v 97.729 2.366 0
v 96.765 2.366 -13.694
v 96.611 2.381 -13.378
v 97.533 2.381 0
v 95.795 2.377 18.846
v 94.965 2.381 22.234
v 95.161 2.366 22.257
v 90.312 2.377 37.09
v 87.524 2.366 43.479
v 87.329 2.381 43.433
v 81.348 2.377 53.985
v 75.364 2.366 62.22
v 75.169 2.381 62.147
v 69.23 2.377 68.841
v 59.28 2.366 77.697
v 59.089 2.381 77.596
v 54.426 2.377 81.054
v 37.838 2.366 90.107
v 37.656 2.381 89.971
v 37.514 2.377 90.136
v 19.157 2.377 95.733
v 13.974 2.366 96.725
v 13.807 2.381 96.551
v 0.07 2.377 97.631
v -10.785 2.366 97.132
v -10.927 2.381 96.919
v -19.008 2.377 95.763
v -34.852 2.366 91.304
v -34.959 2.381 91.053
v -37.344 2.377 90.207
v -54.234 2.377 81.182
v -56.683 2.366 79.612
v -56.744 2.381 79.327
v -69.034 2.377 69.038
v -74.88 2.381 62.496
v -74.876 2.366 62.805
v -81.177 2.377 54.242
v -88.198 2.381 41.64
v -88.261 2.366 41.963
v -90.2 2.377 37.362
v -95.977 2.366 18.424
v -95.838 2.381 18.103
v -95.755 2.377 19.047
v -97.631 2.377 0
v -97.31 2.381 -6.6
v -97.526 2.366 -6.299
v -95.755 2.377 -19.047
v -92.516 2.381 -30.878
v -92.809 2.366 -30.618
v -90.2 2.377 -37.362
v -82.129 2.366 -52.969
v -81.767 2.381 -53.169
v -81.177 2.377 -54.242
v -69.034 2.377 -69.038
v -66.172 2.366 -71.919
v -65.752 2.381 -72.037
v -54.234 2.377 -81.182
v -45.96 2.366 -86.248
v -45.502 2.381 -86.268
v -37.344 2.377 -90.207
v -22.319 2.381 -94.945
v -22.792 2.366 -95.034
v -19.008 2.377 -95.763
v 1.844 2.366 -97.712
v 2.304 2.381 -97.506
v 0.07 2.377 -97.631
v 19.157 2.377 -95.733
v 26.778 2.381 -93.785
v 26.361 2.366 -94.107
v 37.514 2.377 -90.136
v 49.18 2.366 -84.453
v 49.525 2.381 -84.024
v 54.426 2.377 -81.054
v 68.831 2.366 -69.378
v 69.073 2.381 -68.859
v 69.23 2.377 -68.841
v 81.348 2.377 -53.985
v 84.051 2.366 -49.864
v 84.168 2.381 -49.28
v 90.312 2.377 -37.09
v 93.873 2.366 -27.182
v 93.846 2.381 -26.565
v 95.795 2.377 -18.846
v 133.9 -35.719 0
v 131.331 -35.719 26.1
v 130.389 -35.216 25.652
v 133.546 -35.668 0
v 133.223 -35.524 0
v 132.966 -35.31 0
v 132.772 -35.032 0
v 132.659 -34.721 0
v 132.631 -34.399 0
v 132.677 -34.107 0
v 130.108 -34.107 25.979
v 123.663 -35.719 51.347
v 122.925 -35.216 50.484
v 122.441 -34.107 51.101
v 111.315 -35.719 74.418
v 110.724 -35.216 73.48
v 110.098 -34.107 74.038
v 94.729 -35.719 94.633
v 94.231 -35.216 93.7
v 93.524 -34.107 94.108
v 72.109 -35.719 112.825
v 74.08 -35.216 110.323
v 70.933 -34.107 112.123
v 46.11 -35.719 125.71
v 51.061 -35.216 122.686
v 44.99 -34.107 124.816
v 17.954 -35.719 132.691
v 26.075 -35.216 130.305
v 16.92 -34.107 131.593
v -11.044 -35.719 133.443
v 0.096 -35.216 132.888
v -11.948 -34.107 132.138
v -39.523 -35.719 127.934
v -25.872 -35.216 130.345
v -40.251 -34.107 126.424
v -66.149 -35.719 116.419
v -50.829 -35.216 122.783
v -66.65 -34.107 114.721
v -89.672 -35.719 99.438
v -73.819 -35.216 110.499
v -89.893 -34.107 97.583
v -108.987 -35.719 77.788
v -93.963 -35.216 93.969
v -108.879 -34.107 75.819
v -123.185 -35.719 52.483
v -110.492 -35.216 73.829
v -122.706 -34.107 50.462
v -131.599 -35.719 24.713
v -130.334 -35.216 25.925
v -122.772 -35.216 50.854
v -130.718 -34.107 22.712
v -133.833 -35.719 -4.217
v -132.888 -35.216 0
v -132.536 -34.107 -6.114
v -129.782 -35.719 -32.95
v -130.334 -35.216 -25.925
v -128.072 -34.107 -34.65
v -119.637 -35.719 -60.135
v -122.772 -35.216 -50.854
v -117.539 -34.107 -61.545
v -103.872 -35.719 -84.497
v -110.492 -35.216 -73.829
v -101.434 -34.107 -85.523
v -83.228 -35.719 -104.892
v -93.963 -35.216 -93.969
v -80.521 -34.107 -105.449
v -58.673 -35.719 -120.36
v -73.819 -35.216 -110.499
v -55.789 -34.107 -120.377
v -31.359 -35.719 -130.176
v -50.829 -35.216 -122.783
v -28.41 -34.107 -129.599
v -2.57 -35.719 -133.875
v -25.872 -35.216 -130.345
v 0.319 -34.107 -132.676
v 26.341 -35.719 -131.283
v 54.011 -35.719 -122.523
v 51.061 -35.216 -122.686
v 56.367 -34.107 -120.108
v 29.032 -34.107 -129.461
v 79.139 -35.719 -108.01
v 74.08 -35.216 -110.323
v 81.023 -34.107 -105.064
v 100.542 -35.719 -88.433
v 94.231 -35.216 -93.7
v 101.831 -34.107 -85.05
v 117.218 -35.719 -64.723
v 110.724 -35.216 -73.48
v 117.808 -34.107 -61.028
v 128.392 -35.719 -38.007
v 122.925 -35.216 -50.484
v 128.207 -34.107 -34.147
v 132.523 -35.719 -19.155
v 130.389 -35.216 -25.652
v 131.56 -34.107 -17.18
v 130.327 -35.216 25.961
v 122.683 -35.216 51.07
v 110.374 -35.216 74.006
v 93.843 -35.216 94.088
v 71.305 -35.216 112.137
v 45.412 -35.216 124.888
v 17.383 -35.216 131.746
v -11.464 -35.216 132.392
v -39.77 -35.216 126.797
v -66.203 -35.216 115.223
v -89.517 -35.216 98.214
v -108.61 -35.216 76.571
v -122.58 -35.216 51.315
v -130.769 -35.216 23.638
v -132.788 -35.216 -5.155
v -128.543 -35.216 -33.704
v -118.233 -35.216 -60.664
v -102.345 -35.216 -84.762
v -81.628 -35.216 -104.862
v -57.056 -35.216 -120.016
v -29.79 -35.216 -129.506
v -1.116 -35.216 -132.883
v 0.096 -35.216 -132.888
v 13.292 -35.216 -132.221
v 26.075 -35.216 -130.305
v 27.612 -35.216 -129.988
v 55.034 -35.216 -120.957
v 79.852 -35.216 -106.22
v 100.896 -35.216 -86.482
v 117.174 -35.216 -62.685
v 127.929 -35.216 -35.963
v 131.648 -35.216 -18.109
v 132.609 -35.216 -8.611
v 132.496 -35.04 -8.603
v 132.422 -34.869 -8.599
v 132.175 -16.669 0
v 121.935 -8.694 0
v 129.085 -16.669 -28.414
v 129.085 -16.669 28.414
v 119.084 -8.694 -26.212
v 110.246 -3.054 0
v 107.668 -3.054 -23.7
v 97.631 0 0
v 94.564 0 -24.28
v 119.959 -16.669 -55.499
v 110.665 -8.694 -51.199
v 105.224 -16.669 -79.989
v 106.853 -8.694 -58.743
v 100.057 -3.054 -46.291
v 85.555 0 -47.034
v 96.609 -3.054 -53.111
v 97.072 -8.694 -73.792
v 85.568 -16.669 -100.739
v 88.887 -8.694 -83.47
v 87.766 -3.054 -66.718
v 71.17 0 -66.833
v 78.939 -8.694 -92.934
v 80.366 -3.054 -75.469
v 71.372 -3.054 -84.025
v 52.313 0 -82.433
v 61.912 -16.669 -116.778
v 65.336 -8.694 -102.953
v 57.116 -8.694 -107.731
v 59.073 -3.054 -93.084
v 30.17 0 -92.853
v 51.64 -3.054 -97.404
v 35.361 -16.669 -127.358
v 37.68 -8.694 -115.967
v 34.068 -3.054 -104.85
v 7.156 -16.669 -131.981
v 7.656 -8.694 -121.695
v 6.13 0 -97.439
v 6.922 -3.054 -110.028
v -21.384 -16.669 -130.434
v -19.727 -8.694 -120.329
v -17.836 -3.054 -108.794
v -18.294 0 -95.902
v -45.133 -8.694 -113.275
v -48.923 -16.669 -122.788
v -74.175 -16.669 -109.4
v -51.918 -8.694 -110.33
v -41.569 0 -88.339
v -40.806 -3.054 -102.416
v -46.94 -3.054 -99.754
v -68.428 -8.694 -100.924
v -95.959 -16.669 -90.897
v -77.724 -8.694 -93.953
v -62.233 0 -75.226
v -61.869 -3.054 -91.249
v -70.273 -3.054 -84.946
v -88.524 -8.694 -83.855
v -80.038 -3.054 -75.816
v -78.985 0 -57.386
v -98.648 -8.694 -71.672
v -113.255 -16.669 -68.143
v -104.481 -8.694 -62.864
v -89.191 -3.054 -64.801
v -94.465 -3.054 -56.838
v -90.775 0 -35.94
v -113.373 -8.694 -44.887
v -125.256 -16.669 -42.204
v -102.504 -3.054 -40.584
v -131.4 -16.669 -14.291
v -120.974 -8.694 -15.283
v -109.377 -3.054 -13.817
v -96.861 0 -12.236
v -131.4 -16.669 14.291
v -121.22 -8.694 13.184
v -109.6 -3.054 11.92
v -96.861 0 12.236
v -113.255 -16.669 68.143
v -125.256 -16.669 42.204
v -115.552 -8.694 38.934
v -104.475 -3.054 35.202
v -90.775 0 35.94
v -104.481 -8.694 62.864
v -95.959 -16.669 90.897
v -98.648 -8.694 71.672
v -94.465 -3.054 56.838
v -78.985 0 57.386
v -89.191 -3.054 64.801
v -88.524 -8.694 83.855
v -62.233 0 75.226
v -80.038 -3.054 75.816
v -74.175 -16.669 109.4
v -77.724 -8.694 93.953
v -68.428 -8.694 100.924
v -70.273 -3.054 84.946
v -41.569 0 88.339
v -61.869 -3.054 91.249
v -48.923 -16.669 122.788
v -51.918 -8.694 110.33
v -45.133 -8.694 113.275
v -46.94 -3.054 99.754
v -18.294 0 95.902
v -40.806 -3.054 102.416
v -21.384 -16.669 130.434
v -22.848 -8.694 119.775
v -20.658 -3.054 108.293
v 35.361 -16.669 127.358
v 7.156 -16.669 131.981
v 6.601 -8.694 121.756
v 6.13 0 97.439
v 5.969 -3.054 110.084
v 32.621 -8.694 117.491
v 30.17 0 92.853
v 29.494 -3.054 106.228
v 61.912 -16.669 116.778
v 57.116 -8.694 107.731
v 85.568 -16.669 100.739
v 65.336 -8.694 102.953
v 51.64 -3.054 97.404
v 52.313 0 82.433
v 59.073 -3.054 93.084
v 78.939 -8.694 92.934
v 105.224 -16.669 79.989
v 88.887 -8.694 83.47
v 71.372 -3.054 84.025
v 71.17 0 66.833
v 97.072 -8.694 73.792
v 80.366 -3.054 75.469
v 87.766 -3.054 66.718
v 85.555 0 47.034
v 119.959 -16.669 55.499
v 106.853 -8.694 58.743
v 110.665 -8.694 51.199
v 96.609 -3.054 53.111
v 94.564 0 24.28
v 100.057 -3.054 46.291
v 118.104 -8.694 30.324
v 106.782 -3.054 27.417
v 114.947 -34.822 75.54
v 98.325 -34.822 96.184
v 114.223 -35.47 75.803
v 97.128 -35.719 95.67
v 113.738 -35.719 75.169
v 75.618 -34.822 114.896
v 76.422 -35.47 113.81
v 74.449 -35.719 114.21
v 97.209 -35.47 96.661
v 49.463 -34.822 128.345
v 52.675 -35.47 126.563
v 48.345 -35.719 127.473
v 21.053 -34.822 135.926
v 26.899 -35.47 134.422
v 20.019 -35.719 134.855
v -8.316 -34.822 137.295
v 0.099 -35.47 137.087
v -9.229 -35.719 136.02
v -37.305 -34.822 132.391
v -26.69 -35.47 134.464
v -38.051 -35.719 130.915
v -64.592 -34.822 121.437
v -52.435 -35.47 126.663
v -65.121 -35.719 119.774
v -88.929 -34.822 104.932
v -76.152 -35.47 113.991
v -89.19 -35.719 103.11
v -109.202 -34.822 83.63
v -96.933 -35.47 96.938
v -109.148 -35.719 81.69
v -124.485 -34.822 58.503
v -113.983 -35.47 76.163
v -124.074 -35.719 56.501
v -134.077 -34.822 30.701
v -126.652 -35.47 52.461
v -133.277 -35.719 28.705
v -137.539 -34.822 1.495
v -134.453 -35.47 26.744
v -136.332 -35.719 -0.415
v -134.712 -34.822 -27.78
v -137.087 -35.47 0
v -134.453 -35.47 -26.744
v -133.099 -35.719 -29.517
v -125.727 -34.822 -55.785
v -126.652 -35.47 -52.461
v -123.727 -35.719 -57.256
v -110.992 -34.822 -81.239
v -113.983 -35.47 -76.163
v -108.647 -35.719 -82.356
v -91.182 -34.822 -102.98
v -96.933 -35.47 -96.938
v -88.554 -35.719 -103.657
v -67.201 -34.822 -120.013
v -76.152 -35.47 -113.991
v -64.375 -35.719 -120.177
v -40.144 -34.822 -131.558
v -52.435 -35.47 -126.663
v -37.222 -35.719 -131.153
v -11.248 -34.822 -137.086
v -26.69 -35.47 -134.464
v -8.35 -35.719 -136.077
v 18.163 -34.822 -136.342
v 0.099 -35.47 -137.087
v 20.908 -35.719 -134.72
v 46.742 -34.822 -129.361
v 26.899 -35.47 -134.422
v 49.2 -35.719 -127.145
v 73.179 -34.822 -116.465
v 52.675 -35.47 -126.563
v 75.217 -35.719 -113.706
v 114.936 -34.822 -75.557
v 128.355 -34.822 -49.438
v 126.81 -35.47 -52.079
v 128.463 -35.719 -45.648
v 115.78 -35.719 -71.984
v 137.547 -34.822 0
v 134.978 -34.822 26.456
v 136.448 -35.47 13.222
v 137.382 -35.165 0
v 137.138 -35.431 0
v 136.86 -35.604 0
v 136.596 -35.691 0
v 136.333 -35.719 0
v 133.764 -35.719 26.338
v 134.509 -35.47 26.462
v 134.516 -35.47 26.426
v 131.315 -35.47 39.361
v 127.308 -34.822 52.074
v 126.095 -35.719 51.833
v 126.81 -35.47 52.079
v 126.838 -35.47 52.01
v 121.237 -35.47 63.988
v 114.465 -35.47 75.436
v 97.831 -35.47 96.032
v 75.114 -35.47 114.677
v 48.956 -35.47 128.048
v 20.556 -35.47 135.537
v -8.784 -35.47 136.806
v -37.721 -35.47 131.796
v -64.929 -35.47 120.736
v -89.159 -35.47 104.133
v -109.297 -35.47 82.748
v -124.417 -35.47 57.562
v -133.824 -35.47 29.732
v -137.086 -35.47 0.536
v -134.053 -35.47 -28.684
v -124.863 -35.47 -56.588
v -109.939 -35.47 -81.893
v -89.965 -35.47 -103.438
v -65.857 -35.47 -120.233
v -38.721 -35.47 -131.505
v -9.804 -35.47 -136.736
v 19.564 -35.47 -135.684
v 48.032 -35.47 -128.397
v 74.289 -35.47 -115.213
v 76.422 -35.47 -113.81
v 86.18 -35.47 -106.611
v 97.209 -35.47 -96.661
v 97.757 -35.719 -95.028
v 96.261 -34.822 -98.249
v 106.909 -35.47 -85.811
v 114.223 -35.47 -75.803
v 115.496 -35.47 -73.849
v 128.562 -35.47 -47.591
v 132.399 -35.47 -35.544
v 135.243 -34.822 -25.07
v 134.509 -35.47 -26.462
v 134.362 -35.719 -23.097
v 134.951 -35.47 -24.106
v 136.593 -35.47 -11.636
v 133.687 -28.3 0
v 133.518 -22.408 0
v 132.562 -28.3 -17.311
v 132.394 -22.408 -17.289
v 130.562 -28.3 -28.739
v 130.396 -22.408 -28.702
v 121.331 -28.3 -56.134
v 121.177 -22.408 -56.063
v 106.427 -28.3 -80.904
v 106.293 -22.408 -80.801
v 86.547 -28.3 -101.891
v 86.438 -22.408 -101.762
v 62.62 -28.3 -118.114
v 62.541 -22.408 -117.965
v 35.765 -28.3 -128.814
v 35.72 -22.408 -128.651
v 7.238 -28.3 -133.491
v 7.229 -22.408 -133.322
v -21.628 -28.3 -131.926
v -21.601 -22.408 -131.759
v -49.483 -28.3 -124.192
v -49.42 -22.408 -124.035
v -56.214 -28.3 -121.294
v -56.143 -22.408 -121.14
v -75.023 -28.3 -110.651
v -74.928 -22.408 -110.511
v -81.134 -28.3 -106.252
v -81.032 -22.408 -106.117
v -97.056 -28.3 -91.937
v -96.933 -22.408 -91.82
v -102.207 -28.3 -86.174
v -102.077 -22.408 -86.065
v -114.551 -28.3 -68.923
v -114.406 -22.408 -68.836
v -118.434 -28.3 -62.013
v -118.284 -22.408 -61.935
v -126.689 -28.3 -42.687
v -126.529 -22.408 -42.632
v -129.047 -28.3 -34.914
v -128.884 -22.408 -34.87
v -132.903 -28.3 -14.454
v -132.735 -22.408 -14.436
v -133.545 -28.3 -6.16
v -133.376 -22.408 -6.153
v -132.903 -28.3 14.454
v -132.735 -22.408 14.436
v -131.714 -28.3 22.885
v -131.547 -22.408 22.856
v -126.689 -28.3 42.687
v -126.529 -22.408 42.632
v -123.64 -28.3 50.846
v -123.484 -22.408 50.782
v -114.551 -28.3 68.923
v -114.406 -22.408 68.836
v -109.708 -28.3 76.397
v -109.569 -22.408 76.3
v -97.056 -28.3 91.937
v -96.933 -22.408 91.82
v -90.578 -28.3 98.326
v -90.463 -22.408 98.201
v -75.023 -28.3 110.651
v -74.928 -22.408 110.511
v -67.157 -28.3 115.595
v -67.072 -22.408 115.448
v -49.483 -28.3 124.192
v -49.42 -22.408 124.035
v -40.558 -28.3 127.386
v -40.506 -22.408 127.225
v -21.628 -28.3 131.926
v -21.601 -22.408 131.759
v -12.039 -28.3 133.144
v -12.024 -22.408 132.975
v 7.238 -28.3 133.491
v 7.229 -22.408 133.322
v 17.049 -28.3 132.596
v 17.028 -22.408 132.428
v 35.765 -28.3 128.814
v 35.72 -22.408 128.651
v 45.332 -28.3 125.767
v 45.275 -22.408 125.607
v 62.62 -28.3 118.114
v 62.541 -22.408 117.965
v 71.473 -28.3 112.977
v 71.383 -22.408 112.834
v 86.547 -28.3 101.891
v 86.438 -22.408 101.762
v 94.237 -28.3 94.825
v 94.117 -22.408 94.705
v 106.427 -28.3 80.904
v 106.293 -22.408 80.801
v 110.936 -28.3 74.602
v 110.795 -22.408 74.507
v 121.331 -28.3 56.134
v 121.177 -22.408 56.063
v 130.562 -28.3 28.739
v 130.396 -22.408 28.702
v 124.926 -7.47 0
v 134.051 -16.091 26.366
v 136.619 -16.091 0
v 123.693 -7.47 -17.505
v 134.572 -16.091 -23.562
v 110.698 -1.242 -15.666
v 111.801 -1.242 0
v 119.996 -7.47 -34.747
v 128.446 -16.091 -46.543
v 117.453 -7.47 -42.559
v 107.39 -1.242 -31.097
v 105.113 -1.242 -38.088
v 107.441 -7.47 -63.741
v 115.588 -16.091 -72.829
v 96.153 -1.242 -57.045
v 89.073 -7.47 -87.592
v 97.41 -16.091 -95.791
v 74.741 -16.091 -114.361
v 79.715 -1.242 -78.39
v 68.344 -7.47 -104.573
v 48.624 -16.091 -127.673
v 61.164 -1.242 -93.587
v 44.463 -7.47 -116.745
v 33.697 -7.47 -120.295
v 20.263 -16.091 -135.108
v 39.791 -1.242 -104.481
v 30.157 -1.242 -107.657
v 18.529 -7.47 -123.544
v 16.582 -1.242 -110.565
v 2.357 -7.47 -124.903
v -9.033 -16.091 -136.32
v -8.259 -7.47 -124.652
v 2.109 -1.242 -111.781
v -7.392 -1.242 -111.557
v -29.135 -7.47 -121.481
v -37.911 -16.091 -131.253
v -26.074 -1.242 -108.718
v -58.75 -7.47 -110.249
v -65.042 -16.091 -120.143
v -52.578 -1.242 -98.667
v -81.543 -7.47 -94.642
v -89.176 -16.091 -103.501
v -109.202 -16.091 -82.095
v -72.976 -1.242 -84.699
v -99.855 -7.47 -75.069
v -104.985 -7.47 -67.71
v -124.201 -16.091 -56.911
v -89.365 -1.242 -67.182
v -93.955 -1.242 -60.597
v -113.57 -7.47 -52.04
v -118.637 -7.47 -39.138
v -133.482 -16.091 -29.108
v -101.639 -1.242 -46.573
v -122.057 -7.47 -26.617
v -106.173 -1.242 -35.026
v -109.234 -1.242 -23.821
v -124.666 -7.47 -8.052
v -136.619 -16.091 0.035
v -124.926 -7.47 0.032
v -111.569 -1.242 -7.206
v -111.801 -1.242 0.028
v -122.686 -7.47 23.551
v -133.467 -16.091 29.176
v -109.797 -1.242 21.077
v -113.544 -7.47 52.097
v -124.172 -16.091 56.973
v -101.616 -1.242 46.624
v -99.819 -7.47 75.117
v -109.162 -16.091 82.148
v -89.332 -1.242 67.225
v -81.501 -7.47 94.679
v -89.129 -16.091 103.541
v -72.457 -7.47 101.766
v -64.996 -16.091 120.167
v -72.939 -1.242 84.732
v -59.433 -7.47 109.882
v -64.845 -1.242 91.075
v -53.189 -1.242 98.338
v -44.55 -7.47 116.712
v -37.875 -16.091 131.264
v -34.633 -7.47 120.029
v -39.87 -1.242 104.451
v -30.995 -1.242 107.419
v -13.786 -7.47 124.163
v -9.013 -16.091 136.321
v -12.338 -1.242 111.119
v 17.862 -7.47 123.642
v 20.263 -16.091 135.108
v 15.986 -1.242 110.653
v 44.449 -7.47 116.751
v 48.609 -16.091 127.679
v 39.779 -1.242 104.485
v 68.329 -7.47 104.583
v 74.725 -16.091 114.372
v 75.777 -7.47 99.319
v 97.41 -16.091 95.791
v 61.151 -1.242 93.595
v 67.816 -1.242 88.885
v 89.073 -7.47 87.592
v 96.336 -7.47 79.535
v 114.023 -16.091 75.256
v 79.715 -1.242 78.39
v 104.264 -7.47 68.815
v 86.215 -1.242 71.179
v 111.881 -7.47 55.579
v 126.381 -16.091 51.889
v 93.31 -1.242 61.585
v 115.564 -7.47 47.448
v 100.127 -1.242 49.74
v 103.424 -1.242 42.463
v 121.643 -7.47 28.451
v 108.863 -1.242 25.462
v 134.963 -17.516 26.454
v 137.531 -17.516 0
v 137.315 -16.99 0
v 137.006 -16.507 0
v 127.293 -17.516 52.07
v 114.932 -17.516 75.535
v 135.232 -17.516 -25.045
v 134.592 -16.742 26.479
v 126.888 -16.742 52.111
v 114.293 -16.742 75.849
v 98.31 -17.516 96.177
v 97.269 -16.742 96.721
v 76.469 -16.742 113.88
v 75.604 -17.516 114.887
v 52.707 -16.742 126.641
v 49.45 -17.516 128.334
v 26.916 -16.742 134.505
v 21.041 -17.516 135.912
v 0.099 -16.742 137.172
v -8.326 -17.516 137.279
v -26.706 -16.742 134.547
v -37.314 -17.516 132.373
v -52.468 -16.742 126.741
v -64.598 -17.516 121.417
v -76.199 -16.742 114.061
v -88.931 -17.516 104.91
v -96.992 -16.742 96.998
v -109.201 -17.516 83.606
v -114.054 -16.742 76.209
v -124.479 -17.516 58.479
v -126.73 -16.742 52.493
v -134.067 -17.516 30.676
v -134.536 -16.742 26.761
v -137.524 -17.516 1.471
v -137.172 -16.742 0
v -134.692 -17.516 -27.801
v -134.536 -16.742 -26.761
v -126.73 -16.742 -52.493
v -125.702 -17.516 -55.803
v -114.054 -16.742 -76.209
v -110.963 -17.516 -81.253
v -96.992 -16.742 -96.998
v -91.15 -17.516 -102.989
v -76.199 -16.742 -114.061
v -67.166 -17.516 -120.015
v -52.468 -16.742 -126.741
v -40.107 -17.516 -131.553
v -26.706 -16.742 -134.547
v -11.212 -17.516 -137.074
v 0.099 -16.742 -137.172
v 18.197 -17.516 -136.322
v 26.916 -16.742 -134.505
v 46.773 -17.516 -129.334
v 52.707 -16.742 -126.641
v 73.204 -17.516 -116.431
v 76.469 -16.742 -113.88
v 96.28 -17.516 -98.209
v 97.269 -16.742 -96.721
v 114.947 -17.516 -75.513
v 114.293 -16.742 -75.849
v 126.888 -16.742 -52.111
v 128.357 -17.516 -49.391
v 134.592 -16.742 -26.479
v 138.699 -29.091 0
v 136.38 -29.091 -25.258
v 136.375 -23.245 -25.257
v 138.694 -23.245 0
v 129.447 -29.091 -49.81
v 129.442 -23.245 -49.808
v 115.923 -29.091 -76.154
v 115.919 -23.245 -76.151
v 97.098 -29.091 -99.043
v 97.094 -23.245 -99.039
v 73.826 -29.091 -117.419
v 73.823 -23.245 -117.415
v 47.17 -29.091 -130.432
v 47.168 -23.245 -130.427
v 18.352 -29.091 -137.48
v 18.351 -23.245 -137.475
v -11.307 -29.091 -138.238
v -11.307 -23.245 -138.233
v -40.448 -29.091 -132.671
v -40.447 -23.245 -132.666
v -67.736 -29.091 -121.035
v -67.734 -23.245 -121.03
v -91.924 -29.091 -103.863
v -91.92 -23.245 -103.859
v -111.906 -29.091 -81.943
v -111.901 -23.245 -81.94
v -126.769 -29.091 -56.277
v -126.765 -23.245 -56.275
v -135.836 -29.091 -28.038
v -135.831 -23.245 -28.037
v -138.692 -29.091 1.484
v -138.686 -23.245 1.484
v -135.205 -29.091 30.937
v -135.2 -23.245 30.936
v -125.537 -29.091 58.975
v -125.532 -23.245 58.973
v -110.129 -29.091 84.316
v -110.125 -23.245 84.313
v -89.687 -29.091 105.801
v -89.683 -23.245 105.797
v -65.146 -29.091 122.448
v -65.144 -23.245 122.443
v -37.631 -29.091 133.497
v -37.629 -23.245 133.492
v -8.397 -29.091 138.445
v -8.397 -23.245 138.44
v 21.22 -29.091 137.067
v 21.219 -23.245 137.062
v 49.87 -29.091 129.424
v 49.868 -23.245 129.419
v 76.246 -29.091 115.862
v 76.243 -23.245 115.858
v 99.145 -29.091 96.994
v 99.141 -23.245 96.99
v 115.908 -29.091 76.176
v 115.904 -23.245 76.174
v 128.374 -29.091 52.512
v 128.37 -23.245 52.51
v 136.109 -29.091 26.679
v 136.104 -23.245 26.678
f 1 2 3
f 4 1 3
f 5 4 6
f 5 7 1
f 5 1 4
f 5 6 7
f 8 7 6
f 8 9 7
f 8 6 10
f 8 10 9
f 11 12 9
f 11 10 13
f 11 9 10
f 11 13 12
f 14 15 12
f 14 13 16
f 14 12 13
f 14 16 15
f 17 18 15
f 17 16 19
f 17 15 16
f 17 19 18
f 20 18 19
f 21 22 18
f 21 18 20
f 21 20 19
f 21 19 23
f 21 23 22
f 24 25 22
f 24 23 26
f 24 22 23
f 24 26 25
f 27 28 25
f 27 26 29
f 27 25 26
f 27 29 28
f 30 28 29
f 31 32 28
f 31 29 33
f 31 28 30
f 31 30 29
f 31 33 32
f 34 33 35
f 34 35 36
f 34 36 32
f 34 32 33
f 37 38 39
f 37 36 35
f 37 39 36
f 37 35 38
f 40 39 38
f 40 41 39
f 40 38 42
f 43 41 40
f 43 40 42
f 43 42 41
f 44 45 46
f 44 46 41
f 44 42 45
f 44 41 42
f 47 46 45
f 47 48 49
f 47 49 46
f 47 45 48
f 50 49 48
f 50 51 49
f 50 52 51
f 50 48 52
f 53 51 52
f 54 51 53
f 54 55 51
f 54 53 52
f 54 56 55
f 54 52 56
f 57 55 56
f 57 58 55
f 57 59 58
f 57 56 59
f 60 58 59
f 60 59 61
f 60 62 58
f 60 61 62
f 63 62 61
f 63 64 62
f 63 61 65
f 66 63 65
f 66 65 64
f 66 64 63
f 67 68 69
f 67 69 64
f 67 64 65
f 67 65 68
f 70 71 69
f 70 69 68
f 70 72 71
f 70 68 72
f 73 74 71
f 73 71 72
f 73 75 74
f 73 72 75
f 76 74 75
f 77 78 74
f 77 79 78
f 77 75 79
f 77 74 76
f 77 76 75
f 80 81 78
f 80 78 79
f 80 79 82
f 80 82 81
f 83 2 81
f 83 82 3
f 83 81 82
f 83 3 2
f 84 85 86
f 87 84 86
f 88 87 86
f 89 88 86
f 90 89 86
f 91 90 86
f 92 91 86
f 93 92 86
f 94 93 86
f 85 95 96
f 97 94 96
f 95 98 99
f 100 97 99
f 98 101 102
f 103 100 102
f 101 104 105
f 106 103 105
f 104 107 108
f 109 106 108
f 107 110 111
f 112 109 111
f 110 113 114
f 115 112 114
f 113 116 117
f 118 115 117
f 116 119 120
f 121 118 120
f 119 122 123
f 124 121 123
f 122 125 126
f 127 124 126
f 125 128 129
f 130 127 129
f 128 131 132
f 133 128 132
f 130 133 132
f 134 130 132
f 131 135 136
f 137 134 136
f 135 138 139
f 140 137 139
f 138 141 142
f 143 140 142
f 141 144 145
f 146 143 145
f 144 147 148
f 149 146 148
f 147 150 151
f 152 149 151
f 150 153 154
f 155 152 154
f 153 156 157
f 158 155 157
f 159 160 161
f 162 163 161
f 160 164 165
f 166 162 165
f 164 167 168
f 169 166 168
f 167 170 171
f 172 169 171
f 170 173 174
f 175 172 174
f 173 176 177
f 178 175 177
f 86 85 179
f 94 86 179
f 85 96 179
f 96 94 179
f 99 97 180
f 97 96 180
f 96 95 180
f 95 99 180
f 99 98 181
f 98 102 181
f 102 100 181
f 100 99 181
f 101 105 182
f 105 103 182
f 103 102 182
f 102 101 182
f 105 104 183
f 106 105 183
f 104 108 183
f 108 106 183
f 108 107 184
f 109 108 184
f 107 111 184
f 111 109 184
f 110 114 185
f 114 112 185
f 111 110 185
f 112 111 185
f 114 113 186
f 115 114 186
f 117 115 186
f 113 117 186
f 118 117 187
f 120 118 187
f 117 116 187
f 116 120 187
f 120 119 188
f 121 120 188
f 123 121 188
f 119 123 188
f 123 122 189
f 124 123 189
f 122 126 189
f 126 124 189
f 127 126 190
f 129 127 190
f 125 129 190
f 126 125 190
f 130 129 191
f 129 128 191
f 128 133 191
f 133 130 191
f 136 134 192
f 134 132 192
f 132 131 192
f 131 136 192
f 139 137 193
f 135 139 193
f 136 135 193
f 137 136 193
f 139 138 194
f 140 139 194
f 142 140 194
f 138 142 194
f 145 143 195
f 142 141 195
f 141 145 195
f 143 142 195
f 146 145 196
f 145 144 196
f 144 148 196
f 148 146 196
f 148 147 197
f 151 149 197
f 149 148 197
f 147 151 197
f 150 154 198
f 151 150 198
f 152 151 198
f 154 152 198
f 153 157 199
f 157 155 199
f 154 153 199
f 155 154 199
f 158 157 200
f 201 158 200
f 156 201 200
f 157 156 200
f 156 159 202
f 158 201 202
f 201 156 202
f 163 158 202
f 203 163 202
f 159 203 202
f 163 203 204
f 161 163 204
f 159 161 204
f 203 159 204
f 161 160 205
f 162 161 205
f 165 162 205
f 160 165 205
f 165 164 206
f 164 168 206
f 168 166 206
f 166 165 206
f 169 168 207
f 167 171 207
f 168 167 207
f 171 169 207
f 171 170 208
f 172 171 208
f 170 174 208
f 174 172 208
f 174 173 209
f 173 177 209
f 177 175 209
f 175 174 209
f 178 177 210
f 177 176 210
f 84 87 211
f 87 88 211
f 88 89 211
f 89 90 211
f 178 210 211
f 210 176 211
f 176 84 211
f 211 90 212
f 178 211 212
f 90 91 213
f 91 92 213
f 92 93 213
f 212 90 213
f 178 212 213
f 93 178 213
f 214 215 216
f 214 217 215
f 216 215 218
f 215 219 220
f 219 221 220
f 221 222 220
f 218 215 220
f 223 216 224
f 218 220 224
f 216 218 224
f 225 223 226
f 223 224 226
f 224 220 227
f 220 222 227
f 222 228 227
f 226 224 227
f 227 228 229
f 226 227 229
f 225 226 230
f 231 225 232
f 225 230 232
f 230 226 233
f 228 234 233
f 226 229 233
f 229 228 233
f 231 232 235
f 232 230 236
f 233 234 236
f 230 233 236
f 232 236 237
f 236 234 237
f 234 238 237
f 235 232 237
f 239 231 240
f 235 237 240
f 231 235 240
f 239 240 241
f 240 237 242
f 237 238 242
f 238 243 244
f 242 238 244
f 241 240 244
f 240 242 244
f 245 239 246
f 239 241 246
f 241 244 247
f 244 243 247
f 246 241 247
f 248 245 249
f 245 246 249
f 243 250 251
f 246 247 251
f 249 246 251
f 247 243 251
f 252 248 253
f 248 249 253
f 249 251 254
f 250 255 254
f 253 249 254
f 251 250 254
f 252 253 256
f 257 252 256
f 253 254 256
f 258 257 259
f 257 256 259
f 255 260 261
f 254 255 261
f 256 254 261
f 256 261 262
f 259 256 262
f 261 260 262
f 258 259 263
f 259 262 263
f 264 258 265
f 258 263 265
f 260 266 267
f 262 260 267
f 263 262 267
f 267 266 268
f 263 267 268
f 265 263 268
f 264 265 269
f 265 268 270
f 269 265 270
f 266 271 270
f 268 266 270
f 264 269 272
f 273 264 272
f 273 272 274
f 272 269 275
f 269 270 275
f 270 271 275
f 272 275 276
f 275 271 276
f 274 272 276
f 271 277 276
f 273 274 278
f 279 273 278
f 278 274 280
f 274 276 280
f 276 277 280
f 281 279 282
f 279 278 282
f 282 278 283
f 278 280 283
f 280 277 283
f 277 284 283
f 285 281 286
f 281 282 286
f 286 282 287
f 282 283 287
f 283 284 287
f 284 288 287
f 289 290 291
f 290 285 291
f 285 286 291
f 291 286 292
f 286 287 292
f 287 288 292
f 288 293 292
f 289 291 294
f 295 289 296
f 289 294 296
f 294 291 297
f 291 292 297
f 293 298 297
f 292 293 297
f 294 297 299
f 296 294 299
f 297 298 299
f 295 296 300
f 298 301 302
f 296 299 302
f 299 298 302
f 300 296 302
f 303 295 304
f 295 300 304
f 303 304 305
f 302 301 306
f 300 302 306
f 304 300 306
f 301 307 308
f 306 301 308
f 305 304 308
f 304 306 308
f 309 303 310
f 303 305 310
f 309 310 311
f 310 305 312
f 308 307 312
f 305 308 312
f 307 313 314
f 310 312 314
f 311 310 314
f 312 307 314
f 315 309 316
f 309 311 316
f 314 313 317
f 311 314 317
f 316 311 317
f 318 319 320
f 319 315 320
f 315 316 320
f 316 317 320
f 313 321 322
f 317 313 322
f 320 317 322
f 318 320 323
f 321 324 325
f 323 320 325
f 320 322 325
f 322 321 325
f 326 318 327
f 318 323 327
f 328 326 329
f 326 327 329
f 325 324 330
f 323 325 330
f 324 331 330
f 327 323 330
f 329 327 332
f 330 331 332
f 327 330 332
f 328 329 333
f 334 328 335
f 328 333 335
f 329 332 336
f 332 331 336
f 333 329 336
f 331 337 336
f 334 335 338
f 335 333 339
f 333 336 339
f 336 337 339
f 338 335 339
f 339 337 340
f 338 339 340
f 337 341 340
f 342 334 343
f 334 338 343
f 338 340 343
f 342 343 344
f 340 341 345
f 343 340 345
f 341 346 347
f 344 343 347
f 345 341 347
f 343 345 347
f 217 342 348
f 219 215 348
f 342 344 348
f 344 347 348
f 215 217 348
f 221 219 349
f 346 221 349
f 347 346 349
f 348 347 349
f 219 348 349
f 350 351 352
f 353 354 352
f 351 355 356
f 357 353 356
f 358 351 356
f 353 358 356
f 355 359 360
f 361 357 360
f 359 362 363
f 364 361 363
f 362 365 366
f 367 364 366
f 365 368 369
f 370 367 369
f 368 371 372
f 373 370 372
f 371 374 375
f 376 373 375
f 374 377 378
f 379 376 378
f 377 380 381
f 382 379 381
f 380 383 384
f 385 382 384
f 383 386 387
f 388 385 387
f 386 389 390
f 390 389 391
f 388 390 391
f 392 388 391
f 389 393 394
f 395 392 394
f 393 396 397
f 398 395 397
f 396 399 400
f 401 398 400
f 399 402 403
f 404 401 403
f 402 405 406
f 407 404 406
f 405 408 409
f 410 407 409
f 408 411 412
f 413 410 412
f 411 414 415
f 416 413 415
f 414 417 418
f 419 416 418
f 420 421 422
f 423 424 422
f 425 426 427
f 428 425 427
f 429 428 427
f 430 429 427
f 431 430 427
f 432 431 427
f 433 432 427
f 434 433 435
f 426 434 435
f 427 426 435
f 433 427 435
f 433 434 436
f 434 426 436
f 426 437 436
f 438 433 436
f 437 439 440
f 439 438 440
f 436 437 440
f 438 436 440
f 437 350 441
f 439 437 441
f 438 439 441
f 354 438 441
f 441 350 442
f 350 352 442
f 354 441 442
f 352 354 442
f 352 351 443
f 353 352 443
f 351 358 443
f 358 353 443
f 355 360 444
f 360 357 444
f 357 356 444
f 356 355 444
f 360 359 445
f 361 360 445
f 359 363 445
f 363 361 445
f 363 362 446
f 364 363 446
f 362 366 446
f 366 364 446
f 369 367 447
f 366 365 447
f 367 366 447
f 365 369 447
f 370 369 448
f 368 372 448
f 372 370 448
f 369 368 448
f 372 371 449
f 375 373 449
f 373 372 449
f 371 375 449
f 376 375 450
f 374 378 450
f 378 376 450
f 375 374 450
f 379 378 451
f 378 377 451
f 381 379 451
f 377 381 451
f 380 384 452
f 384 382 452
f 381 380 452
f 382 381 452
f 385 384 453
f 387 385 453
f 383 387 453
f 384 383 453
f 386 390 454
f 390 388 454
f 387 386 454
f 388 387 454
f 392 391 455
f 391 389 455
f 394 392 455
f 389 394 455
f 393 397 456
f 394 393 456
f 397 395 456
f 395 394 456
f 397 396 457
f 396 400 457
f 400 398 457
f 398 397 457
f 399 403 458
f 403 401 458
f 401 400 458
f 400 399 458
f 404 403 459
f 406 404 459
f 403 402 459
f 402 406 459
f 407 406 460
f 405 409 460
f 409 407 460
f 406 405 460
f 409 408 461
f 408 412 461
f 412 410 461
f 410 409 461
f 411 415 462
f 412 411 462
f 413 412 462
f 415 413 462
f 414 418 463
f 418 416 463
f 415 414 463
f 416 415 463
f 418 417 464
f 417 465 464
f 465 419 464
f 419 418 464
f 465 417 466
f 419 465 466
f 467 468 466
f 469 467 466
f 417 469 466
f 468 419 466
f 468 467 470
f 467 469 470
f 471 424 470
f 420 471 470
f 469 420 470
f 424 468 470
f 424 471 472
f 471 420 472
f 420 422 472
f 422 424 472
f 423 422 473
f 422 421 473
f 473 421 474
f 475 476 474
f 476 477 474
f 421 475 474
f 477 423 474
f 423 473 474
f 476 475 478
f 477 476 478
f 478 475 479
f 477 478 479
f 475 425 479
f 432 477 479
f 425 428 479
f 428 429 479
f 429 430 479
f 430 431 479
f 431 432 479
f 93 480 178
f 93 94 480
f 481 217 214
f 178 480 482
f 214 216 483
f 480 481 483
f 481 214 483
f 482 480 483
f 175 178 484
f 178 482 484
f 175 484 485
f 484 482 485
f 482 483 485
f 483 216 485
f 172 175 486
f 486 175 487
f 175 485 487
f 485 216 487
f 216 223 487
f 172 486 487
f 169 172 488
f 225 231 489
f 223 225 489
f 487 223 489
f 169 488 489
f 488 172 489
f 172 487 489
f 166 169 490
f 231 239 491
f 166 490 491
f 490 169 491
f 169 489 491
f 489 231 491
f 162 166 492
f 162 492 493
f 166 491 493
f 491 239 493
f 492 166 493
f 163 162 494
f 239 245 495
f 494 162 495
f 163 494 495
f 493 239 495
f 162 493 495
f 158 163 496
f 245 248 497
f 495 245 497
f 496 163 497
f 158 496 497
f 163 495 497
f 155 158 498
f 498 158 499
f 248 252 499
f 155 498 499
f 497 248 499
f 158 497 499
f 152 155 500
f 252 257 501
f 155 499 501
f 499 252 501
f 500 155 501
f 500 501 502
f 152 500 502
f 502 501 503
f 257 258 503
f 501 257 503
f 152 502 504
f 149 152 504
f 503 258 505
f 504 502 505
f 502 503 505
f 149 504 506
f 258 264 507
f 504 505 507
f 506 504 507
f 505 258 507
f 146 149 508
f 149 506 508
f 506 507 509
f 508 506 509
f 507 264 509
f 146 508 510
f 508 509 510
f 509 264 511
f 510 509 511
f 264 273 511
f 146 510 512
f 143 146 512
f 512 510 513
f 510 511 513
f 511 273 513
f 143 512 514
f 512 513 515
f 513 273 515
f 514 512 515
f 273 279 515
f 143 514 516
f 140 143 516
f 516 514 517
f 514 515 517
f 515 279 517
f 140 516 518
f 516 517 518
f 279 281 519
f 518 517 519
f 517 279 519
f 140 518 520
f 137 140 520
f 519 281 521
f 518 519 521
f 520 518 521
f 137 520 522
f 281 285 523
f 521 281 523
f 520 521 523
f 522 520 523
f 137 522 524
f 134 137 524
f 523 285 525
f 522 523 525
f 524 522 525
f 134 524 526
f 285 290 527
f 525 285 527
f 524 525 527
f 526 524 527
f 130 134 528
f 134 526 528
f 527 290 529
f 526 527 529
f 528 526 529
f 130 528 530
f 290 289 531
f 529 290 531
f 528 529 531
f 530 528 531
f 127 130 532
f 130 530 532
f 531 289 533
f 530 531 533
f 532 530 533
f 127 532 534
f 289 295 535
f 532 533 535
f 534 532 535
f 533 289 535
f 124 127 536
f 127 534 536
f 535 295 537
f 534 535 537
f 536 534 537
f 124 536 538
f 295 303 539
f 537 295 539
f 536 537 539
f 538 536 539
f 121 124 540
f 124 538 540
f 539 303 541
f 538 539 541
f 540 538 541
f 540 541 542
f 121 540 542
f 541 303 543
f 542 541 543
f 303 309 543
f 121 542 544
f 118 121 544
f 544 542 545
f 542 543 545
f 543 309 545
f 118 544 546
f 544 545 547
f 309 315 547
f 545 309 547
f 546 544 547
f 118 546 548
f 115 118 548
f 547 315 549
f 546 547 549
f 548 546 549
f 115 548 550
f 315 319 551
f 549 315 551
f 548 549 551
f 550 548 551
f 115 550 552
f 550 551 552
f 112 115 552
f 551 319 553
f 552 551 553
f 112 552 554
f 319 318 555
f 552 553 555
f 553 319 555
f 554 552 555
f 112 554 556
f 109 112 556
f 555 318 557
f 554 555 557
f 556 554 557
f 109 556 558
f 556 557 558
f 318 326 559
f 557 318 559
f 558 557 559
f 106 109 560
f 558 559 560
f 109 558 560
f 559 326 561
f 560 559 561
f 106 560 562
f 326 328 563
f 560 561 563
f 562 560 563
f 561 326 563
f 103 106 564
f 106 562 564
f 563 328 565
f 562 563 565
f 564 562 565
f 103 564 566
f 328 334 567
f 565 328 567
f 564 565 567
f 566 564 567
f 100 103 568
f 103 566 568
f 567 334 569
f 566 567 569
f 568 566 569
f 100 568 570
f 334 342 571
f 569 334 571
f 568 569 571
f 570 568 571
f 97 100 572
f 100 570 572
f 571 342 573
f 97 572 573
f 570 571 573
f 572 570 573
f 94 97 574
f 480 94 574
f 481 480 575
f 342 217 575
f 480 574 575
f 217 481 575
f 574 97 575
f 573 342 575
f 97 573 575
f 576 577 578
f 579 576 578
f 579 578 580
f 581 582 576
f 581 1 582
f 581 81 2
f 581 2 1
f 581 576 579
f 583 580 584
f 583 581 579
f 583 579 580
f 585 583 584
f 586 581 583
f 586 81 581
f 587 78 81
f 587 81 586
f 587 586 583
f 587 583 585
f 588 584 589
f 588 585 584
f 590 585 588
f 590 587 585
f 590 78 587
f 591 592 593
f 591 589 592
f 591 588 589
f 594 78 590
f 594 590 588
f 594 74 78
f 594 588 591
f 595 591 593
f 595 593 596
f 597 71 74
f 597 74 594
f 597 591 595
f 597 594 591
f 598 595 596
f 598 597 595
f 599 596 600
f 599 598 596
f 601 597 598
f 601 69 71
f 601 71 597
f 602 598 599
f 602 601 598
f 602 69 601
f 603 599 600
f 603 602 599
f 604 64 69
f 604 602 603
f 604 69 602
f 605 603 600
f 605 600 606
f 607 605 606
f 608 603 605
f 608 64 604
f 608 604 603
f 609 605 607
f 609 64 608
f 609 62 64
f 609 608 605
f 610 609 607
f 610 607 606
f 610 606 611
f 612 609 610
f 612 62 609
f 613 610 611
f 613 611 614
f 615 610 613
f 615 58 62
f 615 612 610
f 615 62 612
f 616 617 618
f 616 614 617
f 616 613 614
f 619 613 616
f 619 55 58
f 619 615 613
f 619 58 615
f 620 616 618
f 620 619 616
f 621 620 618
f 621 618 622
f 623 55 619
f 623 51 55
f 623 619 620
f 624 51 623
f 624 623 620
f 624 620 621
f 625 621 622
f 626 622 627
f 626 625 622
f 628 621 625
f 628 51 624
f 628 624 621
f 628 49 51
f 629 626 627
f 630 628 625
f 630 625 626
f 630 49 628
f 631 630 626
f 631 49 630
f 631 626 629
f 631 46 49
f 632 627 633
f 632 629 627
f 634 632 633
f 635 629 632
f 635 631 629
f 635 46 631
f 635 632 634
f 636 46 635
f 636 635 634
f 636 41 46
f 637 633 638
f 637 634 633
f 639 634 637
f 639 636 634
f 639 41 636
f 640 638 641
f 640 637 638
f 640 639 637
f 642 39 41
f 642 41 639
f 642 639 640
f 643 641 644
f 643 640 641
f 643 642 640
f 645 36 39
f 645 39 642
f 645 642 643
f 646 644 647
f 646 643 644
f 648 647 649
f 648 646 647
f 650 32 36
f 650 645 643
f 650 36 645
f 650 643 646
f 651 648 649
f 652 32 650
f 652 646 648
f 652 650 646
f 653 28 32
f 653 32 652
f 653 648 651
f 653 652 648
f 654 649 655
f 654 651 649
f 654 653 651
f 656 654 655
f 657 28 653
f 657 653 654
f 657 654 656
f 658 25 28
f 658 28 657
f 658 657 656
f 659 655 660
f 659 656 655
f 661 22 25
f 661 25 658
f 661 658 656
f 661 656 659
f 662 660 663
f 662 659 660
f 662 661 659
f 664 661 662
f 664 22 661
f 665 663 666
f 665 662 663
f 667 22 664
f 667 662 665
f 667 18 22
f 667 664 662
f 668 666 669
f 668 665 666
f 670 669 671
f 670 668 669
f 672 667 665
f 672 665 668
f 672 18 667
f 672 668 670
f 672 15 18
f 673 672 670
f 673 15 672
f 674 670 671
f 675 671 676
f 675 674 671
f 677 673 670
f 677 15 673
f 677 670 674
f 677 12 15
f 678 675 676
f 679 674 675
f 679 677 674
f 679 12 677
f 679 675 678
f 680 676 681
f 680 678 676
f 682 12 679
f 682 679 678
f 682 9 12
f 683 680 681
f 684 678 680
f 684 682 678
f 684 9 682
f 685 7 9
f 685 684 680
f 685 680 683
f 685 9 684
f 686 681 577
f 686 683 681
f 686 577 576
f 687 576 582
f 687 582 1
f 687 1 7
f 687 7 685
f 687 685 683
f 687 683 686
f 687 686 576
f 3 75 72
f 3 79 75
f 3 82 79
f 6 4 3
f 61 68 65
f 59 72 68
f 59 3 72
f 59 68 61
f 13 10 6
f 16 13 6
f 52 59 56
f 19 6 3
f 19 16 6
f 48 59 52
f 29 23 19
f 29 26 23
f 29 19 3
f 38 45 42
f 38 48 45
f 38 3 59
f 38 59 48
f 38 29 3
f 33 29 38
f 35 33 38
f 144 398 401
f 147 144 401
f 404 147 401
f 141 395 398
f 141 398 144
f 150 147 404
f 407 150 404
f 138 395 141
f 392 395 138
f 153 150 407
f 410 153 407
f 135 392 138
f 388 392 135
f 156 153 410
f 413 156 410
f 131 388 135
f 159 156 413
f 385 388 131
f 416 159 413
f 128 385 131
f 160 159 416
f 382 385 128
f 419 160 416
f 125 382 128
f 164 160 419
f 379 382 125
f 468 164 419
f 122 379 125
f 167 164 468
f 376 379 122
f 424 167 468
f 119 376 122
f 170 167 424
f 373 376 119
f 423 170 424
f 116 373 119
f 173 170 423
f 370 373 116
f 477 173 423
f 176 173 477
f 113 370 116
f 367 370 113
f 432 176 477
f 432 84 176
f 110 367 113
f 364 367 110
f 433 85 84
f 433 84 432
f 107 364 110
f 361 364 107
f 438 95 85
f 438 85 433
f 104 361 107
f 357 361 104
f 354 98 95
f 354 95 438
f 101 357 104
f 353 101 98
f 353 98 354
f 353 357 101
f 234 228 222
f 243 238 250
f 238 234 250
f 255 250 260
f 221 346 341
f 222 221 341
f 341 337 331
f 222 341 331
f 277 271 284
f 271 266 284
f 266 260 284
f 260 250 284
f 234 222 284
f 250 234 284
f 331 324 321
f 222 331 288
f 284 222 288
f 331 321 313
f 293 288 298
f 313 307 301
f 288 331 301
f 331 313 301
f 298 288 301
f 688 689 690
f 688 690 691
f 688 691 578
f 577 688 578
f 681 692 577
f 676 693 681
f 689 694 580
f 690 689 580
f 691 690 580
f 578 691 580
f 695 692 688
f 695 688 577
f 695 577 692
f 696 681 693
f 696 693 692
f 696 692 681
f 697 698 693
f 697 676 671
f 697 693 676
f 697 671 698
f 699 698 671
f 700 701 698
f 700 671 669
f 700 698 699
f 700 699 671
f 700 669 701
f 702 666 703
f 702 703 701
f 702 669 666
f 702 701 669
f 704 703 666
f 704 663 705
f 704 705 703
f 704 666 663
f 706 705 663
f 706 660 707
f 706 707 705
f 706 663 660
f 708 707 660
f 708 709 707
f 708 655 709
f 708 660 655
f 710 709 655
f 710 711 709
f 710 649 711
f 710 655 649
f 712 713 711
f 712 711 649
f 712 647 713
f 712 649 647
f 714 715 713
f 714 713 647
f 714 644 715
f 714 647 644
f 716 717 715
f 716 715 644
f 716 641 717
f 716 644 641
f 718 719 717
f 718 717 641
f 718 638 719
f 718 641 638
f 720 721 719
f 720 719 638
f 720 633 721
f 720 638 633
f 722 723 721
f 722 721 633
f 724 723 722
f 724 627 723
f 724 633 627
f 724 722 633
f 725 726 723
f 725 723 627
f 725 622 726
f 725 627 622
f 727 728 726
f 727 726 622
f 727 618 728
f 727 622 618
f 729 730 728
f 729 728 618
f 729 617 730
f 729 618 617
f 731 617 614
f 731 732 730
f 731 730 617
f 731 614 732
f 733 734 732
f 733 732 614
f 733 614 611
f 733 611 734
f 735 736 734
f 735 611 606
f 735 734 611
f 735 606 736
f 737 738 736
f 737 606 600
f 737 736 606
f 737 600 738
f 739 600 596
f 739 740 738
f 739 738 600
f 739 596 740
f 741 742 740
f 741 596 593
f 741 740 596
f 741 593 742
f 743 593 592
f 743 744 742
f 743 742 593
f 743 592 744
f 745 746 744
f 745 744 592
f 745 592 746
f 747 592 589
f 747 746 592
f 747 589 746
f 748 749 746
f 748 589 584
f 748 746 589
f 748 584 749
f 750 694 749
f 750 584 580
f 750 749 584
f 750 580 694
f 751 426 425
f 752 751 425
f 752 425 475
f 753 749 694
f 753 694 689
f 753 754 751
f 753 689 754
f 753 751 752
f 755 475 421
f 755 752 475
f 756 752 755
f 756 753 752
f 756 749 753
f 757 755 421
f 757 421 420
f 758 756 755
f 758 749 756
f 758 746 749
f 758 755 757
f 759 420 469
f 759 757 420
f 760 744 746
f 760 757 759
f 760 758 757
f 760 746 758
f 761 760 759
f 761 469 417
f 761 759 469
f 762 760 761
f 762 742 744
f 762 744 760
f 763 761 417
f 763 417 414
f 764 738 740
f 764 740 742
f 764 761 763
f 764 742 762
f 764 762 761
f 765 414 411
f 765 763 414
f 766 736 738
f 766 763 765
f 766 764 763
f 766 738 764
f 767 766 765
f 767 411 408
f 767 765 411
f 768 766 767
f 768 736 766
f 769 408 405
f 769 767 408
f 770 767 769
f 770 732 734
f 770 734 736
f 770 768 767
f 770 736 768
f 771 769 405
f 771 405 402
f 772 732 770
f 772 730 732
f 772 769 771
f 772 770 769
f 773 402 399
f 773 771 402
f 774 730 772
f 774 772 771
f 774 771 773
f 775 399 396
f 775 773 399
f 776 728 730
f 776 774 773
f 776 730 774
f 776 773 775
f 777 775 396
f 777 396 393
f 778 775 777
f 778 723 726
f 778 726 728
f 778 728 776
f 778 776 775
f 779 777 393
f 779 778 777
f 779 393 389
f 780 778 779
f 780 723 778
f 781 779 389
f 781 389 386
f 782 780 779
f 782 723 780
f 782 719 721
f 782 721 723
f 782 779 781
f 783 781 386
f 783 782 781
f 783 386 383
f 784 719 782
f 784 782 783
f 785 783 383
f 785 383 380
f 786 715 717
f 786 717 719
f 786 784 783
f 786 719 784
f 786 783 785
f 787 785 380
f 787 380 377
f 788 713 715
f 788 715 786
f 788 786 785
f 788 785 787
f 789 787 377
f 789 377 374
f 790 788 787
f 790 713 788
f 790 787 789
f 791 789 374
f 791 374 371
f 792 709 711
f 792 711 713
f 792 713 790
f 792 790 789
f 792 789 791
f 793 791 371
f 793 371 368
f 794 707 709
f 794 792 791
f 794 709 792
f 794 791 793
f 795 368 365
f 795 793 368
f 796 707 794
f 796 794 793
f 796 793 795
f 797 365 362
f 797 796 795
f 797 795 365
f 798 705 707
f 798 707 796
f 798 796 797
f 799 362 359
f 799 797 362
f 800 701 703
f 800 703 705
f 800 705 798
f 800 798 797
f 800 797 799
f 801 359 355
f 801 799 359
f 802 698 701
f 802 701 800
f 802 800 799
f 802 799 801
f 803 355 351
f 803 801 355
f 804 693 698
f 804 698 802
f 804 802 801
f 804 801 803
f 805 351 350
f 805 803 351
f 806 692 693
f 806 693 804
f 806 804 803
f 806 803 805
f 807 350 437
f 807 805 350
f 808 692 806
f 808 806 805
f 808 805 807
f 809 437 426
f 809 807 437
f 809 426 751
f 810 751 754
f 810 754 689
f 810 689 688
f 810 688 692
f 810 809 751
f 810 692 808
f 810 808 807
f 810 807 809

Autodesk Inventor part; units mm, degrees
ref_plane "YZ Plane" through (0, 0, 0) normal (1, 0, 0) x (0, 1, 0)
ref_plane "XZ Plane" through (0, 0, 0) normal (0, 1, 0) x (-1, 0, 0)
ref_plane "XY Plane" through (0, 0, 0) normal (0, 0, 1) x (1, 0, 0)
sketch "Sketch1" plane through (0, 0, 0) normal (0, 1, 0) x (-1, 0, 0)
  circle A0 centre (0, 0) radius 97.6313
  dimension "d1" = 195.2625
extrude "Extrusion1" add sketch "Sketch1" along normal blind 2.3813
sketch "Sketch2" plane through (0, 0, 0) normal (0, 0, 1) x (1, 0, 0)
  line L0 (97.6313, 2.3813) -> (-97.6313, 2.3813) projected
  line L1 (-97.6313, 0) -> (97.6313, 0) projected
  line L2 (97.6313, 2.3813) -> (97.6313, 0)
  line L3 (97.6313, 2.3813) -> (97.6313, -16.6688)
  arc A0 (137.2553, -16.6688) -> (97.6313, 2.3813) centre (86.0498, -72.4422) ccw
  arc A1 (132.1753, -16.6687) -> (97.6313, 0) centre (89.5948, -60.7831) ccw
  line L4 (0, 2.3813) -> (0, -35.7188)
  line L5 (137.2552, -35.7188) -> (132.1752, -35.7188)
  arc A2 (132.1752, -35.7188) -> (132.1753, -16.6687) centre (104.394, -26.1937) ccw
  arc A3 (137.2552, -35.7188) -> (137.2553, -16.6688) centre (109.474, -26.1937) ccw
  point P0 (0, 0)
  dimension "d14" = 19.05
revolve "Revolution1" add sketch "Sketch2" angle 360 about axis through (0, 2.3813, 0) along (0, -1, 0) contours A0 A3 L5 A2 A1 L2
fillet "Fillet1" radius 3.175 1 edges at (-137.2553, -16.6687, 0)
fillet "Fillet2" radius 1.27 1 edges at (-137.2553, -35.7187, 0)
fillet "Fillet3" radius 1.27 1 edges at (-97.6313, 2.3813, 0)
fillet "Fillet4" radius 1.27 1 edges at (-132.1753, -35.7187, 0)
properties part number "3061Frisbee"
